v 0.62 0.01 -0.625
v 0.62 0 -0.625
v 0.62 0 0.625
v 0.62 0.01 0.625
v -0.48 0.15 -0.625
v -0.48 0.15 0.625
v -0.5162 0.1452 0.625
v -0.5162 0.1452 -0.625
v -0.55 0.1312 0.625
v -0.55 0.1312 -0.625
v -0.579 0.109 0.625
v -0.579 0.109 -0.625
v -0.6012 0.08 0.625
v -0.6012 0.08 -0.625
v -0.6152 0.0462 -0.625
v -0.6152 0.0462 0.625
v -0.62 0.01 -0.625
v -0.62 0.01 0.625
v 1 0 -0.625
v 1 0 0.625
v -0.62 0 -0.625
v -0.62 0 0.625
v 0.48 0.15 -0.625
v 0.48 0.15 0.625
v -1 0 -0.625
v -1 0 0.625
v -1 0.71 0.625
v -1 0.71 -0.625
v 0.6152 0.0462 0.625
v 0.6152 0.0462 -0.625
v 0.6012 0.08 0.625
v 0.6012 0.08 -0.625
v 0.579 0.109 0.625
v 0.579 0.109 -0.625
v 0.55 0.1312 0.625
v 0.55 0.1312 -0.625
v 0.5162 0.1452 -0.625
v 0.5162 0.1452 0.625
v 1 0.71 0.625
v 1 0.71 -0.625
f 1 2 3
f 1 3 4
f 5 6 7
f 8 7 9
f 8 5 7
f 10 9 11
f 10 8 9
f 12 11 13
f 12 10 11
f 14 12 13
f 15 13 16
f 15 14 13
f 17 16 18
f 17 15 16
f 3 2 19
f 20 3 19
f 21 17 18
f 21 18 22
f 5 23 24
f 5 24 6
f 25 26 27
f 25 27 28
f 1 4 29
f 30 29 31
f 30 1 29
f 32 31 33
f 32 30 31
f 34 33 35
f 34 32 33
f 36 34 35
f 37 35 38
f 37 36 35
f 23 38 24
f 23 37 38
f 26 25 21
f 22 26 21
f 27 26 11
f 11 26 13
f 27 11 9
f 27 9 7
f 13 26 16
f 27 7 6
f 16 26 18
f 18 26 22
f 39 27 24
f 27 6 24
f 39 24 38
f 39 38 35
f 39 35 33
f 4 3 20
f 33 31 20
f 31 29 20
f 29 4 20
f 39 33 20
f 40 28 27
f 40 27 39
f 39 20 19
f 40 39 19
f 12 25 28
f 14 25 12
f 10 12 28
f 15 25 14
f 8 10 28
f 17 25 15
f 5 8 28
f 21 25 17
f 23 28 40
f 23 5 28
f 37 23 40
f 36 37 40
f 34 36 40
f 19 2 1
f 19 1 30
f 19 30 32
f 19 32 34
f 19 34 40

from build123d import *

# Parameters (mm, degrees)
SKETCH1_W               = 2
SKETCH1_H               = 1.25
BOSS_EXTRUDE1_DEPTH     = 0.71
CUT_EXTRUDE1_DEPTH      = 1.625
CUT_EXTRUDE1_DEPTH_BACK = 1.625


with BuildPart() as part:
    # Sketch1 → Boss-Extrude1 (new body)
    with BuildSketch(Plane(origin=(0, 0, 0), x_dir=(1, 0, 0), z_dir=(0, 1, 0))):
        Rectangle(SKETCH1_W, SKETCH1_H)
    extrude(amount=BOSS_EXTRUDE1_DEPTH)

    # Sketch2 → Cut-Extrude1 (cut, two sides)
    with BuildSketch(Plane.XY) as cut_extrude1_sk:
        with BuildLine():
            Line((-0.62, 0), (0.62, 0))
            Line((0.62, 0), (0.62, 0.01))
            ThreePointArc((0.62, 0.01), (0.578994949, 0.108994949), (0.48, 0.15))
            Line((0.48, 0.15), (-0.48, 0.15))
            ThreePointArc((-0.48, 0.15), (-0.578994949, 0.108994949), (-0.62, 0.01))
            Line((-0.62, 0.01), (-0.62, 0))
        make_face()
    extrude(amount=CUT_EXTRUDE1_DEPTH, mode=Mode.SUBTRACT)
    extrude(cut_extrude1_sk.sketch, amount=-CUT_EXTRUDE1_DEPTH_BACK, mode=Mode.SUBTRACT)


solid = part.part
